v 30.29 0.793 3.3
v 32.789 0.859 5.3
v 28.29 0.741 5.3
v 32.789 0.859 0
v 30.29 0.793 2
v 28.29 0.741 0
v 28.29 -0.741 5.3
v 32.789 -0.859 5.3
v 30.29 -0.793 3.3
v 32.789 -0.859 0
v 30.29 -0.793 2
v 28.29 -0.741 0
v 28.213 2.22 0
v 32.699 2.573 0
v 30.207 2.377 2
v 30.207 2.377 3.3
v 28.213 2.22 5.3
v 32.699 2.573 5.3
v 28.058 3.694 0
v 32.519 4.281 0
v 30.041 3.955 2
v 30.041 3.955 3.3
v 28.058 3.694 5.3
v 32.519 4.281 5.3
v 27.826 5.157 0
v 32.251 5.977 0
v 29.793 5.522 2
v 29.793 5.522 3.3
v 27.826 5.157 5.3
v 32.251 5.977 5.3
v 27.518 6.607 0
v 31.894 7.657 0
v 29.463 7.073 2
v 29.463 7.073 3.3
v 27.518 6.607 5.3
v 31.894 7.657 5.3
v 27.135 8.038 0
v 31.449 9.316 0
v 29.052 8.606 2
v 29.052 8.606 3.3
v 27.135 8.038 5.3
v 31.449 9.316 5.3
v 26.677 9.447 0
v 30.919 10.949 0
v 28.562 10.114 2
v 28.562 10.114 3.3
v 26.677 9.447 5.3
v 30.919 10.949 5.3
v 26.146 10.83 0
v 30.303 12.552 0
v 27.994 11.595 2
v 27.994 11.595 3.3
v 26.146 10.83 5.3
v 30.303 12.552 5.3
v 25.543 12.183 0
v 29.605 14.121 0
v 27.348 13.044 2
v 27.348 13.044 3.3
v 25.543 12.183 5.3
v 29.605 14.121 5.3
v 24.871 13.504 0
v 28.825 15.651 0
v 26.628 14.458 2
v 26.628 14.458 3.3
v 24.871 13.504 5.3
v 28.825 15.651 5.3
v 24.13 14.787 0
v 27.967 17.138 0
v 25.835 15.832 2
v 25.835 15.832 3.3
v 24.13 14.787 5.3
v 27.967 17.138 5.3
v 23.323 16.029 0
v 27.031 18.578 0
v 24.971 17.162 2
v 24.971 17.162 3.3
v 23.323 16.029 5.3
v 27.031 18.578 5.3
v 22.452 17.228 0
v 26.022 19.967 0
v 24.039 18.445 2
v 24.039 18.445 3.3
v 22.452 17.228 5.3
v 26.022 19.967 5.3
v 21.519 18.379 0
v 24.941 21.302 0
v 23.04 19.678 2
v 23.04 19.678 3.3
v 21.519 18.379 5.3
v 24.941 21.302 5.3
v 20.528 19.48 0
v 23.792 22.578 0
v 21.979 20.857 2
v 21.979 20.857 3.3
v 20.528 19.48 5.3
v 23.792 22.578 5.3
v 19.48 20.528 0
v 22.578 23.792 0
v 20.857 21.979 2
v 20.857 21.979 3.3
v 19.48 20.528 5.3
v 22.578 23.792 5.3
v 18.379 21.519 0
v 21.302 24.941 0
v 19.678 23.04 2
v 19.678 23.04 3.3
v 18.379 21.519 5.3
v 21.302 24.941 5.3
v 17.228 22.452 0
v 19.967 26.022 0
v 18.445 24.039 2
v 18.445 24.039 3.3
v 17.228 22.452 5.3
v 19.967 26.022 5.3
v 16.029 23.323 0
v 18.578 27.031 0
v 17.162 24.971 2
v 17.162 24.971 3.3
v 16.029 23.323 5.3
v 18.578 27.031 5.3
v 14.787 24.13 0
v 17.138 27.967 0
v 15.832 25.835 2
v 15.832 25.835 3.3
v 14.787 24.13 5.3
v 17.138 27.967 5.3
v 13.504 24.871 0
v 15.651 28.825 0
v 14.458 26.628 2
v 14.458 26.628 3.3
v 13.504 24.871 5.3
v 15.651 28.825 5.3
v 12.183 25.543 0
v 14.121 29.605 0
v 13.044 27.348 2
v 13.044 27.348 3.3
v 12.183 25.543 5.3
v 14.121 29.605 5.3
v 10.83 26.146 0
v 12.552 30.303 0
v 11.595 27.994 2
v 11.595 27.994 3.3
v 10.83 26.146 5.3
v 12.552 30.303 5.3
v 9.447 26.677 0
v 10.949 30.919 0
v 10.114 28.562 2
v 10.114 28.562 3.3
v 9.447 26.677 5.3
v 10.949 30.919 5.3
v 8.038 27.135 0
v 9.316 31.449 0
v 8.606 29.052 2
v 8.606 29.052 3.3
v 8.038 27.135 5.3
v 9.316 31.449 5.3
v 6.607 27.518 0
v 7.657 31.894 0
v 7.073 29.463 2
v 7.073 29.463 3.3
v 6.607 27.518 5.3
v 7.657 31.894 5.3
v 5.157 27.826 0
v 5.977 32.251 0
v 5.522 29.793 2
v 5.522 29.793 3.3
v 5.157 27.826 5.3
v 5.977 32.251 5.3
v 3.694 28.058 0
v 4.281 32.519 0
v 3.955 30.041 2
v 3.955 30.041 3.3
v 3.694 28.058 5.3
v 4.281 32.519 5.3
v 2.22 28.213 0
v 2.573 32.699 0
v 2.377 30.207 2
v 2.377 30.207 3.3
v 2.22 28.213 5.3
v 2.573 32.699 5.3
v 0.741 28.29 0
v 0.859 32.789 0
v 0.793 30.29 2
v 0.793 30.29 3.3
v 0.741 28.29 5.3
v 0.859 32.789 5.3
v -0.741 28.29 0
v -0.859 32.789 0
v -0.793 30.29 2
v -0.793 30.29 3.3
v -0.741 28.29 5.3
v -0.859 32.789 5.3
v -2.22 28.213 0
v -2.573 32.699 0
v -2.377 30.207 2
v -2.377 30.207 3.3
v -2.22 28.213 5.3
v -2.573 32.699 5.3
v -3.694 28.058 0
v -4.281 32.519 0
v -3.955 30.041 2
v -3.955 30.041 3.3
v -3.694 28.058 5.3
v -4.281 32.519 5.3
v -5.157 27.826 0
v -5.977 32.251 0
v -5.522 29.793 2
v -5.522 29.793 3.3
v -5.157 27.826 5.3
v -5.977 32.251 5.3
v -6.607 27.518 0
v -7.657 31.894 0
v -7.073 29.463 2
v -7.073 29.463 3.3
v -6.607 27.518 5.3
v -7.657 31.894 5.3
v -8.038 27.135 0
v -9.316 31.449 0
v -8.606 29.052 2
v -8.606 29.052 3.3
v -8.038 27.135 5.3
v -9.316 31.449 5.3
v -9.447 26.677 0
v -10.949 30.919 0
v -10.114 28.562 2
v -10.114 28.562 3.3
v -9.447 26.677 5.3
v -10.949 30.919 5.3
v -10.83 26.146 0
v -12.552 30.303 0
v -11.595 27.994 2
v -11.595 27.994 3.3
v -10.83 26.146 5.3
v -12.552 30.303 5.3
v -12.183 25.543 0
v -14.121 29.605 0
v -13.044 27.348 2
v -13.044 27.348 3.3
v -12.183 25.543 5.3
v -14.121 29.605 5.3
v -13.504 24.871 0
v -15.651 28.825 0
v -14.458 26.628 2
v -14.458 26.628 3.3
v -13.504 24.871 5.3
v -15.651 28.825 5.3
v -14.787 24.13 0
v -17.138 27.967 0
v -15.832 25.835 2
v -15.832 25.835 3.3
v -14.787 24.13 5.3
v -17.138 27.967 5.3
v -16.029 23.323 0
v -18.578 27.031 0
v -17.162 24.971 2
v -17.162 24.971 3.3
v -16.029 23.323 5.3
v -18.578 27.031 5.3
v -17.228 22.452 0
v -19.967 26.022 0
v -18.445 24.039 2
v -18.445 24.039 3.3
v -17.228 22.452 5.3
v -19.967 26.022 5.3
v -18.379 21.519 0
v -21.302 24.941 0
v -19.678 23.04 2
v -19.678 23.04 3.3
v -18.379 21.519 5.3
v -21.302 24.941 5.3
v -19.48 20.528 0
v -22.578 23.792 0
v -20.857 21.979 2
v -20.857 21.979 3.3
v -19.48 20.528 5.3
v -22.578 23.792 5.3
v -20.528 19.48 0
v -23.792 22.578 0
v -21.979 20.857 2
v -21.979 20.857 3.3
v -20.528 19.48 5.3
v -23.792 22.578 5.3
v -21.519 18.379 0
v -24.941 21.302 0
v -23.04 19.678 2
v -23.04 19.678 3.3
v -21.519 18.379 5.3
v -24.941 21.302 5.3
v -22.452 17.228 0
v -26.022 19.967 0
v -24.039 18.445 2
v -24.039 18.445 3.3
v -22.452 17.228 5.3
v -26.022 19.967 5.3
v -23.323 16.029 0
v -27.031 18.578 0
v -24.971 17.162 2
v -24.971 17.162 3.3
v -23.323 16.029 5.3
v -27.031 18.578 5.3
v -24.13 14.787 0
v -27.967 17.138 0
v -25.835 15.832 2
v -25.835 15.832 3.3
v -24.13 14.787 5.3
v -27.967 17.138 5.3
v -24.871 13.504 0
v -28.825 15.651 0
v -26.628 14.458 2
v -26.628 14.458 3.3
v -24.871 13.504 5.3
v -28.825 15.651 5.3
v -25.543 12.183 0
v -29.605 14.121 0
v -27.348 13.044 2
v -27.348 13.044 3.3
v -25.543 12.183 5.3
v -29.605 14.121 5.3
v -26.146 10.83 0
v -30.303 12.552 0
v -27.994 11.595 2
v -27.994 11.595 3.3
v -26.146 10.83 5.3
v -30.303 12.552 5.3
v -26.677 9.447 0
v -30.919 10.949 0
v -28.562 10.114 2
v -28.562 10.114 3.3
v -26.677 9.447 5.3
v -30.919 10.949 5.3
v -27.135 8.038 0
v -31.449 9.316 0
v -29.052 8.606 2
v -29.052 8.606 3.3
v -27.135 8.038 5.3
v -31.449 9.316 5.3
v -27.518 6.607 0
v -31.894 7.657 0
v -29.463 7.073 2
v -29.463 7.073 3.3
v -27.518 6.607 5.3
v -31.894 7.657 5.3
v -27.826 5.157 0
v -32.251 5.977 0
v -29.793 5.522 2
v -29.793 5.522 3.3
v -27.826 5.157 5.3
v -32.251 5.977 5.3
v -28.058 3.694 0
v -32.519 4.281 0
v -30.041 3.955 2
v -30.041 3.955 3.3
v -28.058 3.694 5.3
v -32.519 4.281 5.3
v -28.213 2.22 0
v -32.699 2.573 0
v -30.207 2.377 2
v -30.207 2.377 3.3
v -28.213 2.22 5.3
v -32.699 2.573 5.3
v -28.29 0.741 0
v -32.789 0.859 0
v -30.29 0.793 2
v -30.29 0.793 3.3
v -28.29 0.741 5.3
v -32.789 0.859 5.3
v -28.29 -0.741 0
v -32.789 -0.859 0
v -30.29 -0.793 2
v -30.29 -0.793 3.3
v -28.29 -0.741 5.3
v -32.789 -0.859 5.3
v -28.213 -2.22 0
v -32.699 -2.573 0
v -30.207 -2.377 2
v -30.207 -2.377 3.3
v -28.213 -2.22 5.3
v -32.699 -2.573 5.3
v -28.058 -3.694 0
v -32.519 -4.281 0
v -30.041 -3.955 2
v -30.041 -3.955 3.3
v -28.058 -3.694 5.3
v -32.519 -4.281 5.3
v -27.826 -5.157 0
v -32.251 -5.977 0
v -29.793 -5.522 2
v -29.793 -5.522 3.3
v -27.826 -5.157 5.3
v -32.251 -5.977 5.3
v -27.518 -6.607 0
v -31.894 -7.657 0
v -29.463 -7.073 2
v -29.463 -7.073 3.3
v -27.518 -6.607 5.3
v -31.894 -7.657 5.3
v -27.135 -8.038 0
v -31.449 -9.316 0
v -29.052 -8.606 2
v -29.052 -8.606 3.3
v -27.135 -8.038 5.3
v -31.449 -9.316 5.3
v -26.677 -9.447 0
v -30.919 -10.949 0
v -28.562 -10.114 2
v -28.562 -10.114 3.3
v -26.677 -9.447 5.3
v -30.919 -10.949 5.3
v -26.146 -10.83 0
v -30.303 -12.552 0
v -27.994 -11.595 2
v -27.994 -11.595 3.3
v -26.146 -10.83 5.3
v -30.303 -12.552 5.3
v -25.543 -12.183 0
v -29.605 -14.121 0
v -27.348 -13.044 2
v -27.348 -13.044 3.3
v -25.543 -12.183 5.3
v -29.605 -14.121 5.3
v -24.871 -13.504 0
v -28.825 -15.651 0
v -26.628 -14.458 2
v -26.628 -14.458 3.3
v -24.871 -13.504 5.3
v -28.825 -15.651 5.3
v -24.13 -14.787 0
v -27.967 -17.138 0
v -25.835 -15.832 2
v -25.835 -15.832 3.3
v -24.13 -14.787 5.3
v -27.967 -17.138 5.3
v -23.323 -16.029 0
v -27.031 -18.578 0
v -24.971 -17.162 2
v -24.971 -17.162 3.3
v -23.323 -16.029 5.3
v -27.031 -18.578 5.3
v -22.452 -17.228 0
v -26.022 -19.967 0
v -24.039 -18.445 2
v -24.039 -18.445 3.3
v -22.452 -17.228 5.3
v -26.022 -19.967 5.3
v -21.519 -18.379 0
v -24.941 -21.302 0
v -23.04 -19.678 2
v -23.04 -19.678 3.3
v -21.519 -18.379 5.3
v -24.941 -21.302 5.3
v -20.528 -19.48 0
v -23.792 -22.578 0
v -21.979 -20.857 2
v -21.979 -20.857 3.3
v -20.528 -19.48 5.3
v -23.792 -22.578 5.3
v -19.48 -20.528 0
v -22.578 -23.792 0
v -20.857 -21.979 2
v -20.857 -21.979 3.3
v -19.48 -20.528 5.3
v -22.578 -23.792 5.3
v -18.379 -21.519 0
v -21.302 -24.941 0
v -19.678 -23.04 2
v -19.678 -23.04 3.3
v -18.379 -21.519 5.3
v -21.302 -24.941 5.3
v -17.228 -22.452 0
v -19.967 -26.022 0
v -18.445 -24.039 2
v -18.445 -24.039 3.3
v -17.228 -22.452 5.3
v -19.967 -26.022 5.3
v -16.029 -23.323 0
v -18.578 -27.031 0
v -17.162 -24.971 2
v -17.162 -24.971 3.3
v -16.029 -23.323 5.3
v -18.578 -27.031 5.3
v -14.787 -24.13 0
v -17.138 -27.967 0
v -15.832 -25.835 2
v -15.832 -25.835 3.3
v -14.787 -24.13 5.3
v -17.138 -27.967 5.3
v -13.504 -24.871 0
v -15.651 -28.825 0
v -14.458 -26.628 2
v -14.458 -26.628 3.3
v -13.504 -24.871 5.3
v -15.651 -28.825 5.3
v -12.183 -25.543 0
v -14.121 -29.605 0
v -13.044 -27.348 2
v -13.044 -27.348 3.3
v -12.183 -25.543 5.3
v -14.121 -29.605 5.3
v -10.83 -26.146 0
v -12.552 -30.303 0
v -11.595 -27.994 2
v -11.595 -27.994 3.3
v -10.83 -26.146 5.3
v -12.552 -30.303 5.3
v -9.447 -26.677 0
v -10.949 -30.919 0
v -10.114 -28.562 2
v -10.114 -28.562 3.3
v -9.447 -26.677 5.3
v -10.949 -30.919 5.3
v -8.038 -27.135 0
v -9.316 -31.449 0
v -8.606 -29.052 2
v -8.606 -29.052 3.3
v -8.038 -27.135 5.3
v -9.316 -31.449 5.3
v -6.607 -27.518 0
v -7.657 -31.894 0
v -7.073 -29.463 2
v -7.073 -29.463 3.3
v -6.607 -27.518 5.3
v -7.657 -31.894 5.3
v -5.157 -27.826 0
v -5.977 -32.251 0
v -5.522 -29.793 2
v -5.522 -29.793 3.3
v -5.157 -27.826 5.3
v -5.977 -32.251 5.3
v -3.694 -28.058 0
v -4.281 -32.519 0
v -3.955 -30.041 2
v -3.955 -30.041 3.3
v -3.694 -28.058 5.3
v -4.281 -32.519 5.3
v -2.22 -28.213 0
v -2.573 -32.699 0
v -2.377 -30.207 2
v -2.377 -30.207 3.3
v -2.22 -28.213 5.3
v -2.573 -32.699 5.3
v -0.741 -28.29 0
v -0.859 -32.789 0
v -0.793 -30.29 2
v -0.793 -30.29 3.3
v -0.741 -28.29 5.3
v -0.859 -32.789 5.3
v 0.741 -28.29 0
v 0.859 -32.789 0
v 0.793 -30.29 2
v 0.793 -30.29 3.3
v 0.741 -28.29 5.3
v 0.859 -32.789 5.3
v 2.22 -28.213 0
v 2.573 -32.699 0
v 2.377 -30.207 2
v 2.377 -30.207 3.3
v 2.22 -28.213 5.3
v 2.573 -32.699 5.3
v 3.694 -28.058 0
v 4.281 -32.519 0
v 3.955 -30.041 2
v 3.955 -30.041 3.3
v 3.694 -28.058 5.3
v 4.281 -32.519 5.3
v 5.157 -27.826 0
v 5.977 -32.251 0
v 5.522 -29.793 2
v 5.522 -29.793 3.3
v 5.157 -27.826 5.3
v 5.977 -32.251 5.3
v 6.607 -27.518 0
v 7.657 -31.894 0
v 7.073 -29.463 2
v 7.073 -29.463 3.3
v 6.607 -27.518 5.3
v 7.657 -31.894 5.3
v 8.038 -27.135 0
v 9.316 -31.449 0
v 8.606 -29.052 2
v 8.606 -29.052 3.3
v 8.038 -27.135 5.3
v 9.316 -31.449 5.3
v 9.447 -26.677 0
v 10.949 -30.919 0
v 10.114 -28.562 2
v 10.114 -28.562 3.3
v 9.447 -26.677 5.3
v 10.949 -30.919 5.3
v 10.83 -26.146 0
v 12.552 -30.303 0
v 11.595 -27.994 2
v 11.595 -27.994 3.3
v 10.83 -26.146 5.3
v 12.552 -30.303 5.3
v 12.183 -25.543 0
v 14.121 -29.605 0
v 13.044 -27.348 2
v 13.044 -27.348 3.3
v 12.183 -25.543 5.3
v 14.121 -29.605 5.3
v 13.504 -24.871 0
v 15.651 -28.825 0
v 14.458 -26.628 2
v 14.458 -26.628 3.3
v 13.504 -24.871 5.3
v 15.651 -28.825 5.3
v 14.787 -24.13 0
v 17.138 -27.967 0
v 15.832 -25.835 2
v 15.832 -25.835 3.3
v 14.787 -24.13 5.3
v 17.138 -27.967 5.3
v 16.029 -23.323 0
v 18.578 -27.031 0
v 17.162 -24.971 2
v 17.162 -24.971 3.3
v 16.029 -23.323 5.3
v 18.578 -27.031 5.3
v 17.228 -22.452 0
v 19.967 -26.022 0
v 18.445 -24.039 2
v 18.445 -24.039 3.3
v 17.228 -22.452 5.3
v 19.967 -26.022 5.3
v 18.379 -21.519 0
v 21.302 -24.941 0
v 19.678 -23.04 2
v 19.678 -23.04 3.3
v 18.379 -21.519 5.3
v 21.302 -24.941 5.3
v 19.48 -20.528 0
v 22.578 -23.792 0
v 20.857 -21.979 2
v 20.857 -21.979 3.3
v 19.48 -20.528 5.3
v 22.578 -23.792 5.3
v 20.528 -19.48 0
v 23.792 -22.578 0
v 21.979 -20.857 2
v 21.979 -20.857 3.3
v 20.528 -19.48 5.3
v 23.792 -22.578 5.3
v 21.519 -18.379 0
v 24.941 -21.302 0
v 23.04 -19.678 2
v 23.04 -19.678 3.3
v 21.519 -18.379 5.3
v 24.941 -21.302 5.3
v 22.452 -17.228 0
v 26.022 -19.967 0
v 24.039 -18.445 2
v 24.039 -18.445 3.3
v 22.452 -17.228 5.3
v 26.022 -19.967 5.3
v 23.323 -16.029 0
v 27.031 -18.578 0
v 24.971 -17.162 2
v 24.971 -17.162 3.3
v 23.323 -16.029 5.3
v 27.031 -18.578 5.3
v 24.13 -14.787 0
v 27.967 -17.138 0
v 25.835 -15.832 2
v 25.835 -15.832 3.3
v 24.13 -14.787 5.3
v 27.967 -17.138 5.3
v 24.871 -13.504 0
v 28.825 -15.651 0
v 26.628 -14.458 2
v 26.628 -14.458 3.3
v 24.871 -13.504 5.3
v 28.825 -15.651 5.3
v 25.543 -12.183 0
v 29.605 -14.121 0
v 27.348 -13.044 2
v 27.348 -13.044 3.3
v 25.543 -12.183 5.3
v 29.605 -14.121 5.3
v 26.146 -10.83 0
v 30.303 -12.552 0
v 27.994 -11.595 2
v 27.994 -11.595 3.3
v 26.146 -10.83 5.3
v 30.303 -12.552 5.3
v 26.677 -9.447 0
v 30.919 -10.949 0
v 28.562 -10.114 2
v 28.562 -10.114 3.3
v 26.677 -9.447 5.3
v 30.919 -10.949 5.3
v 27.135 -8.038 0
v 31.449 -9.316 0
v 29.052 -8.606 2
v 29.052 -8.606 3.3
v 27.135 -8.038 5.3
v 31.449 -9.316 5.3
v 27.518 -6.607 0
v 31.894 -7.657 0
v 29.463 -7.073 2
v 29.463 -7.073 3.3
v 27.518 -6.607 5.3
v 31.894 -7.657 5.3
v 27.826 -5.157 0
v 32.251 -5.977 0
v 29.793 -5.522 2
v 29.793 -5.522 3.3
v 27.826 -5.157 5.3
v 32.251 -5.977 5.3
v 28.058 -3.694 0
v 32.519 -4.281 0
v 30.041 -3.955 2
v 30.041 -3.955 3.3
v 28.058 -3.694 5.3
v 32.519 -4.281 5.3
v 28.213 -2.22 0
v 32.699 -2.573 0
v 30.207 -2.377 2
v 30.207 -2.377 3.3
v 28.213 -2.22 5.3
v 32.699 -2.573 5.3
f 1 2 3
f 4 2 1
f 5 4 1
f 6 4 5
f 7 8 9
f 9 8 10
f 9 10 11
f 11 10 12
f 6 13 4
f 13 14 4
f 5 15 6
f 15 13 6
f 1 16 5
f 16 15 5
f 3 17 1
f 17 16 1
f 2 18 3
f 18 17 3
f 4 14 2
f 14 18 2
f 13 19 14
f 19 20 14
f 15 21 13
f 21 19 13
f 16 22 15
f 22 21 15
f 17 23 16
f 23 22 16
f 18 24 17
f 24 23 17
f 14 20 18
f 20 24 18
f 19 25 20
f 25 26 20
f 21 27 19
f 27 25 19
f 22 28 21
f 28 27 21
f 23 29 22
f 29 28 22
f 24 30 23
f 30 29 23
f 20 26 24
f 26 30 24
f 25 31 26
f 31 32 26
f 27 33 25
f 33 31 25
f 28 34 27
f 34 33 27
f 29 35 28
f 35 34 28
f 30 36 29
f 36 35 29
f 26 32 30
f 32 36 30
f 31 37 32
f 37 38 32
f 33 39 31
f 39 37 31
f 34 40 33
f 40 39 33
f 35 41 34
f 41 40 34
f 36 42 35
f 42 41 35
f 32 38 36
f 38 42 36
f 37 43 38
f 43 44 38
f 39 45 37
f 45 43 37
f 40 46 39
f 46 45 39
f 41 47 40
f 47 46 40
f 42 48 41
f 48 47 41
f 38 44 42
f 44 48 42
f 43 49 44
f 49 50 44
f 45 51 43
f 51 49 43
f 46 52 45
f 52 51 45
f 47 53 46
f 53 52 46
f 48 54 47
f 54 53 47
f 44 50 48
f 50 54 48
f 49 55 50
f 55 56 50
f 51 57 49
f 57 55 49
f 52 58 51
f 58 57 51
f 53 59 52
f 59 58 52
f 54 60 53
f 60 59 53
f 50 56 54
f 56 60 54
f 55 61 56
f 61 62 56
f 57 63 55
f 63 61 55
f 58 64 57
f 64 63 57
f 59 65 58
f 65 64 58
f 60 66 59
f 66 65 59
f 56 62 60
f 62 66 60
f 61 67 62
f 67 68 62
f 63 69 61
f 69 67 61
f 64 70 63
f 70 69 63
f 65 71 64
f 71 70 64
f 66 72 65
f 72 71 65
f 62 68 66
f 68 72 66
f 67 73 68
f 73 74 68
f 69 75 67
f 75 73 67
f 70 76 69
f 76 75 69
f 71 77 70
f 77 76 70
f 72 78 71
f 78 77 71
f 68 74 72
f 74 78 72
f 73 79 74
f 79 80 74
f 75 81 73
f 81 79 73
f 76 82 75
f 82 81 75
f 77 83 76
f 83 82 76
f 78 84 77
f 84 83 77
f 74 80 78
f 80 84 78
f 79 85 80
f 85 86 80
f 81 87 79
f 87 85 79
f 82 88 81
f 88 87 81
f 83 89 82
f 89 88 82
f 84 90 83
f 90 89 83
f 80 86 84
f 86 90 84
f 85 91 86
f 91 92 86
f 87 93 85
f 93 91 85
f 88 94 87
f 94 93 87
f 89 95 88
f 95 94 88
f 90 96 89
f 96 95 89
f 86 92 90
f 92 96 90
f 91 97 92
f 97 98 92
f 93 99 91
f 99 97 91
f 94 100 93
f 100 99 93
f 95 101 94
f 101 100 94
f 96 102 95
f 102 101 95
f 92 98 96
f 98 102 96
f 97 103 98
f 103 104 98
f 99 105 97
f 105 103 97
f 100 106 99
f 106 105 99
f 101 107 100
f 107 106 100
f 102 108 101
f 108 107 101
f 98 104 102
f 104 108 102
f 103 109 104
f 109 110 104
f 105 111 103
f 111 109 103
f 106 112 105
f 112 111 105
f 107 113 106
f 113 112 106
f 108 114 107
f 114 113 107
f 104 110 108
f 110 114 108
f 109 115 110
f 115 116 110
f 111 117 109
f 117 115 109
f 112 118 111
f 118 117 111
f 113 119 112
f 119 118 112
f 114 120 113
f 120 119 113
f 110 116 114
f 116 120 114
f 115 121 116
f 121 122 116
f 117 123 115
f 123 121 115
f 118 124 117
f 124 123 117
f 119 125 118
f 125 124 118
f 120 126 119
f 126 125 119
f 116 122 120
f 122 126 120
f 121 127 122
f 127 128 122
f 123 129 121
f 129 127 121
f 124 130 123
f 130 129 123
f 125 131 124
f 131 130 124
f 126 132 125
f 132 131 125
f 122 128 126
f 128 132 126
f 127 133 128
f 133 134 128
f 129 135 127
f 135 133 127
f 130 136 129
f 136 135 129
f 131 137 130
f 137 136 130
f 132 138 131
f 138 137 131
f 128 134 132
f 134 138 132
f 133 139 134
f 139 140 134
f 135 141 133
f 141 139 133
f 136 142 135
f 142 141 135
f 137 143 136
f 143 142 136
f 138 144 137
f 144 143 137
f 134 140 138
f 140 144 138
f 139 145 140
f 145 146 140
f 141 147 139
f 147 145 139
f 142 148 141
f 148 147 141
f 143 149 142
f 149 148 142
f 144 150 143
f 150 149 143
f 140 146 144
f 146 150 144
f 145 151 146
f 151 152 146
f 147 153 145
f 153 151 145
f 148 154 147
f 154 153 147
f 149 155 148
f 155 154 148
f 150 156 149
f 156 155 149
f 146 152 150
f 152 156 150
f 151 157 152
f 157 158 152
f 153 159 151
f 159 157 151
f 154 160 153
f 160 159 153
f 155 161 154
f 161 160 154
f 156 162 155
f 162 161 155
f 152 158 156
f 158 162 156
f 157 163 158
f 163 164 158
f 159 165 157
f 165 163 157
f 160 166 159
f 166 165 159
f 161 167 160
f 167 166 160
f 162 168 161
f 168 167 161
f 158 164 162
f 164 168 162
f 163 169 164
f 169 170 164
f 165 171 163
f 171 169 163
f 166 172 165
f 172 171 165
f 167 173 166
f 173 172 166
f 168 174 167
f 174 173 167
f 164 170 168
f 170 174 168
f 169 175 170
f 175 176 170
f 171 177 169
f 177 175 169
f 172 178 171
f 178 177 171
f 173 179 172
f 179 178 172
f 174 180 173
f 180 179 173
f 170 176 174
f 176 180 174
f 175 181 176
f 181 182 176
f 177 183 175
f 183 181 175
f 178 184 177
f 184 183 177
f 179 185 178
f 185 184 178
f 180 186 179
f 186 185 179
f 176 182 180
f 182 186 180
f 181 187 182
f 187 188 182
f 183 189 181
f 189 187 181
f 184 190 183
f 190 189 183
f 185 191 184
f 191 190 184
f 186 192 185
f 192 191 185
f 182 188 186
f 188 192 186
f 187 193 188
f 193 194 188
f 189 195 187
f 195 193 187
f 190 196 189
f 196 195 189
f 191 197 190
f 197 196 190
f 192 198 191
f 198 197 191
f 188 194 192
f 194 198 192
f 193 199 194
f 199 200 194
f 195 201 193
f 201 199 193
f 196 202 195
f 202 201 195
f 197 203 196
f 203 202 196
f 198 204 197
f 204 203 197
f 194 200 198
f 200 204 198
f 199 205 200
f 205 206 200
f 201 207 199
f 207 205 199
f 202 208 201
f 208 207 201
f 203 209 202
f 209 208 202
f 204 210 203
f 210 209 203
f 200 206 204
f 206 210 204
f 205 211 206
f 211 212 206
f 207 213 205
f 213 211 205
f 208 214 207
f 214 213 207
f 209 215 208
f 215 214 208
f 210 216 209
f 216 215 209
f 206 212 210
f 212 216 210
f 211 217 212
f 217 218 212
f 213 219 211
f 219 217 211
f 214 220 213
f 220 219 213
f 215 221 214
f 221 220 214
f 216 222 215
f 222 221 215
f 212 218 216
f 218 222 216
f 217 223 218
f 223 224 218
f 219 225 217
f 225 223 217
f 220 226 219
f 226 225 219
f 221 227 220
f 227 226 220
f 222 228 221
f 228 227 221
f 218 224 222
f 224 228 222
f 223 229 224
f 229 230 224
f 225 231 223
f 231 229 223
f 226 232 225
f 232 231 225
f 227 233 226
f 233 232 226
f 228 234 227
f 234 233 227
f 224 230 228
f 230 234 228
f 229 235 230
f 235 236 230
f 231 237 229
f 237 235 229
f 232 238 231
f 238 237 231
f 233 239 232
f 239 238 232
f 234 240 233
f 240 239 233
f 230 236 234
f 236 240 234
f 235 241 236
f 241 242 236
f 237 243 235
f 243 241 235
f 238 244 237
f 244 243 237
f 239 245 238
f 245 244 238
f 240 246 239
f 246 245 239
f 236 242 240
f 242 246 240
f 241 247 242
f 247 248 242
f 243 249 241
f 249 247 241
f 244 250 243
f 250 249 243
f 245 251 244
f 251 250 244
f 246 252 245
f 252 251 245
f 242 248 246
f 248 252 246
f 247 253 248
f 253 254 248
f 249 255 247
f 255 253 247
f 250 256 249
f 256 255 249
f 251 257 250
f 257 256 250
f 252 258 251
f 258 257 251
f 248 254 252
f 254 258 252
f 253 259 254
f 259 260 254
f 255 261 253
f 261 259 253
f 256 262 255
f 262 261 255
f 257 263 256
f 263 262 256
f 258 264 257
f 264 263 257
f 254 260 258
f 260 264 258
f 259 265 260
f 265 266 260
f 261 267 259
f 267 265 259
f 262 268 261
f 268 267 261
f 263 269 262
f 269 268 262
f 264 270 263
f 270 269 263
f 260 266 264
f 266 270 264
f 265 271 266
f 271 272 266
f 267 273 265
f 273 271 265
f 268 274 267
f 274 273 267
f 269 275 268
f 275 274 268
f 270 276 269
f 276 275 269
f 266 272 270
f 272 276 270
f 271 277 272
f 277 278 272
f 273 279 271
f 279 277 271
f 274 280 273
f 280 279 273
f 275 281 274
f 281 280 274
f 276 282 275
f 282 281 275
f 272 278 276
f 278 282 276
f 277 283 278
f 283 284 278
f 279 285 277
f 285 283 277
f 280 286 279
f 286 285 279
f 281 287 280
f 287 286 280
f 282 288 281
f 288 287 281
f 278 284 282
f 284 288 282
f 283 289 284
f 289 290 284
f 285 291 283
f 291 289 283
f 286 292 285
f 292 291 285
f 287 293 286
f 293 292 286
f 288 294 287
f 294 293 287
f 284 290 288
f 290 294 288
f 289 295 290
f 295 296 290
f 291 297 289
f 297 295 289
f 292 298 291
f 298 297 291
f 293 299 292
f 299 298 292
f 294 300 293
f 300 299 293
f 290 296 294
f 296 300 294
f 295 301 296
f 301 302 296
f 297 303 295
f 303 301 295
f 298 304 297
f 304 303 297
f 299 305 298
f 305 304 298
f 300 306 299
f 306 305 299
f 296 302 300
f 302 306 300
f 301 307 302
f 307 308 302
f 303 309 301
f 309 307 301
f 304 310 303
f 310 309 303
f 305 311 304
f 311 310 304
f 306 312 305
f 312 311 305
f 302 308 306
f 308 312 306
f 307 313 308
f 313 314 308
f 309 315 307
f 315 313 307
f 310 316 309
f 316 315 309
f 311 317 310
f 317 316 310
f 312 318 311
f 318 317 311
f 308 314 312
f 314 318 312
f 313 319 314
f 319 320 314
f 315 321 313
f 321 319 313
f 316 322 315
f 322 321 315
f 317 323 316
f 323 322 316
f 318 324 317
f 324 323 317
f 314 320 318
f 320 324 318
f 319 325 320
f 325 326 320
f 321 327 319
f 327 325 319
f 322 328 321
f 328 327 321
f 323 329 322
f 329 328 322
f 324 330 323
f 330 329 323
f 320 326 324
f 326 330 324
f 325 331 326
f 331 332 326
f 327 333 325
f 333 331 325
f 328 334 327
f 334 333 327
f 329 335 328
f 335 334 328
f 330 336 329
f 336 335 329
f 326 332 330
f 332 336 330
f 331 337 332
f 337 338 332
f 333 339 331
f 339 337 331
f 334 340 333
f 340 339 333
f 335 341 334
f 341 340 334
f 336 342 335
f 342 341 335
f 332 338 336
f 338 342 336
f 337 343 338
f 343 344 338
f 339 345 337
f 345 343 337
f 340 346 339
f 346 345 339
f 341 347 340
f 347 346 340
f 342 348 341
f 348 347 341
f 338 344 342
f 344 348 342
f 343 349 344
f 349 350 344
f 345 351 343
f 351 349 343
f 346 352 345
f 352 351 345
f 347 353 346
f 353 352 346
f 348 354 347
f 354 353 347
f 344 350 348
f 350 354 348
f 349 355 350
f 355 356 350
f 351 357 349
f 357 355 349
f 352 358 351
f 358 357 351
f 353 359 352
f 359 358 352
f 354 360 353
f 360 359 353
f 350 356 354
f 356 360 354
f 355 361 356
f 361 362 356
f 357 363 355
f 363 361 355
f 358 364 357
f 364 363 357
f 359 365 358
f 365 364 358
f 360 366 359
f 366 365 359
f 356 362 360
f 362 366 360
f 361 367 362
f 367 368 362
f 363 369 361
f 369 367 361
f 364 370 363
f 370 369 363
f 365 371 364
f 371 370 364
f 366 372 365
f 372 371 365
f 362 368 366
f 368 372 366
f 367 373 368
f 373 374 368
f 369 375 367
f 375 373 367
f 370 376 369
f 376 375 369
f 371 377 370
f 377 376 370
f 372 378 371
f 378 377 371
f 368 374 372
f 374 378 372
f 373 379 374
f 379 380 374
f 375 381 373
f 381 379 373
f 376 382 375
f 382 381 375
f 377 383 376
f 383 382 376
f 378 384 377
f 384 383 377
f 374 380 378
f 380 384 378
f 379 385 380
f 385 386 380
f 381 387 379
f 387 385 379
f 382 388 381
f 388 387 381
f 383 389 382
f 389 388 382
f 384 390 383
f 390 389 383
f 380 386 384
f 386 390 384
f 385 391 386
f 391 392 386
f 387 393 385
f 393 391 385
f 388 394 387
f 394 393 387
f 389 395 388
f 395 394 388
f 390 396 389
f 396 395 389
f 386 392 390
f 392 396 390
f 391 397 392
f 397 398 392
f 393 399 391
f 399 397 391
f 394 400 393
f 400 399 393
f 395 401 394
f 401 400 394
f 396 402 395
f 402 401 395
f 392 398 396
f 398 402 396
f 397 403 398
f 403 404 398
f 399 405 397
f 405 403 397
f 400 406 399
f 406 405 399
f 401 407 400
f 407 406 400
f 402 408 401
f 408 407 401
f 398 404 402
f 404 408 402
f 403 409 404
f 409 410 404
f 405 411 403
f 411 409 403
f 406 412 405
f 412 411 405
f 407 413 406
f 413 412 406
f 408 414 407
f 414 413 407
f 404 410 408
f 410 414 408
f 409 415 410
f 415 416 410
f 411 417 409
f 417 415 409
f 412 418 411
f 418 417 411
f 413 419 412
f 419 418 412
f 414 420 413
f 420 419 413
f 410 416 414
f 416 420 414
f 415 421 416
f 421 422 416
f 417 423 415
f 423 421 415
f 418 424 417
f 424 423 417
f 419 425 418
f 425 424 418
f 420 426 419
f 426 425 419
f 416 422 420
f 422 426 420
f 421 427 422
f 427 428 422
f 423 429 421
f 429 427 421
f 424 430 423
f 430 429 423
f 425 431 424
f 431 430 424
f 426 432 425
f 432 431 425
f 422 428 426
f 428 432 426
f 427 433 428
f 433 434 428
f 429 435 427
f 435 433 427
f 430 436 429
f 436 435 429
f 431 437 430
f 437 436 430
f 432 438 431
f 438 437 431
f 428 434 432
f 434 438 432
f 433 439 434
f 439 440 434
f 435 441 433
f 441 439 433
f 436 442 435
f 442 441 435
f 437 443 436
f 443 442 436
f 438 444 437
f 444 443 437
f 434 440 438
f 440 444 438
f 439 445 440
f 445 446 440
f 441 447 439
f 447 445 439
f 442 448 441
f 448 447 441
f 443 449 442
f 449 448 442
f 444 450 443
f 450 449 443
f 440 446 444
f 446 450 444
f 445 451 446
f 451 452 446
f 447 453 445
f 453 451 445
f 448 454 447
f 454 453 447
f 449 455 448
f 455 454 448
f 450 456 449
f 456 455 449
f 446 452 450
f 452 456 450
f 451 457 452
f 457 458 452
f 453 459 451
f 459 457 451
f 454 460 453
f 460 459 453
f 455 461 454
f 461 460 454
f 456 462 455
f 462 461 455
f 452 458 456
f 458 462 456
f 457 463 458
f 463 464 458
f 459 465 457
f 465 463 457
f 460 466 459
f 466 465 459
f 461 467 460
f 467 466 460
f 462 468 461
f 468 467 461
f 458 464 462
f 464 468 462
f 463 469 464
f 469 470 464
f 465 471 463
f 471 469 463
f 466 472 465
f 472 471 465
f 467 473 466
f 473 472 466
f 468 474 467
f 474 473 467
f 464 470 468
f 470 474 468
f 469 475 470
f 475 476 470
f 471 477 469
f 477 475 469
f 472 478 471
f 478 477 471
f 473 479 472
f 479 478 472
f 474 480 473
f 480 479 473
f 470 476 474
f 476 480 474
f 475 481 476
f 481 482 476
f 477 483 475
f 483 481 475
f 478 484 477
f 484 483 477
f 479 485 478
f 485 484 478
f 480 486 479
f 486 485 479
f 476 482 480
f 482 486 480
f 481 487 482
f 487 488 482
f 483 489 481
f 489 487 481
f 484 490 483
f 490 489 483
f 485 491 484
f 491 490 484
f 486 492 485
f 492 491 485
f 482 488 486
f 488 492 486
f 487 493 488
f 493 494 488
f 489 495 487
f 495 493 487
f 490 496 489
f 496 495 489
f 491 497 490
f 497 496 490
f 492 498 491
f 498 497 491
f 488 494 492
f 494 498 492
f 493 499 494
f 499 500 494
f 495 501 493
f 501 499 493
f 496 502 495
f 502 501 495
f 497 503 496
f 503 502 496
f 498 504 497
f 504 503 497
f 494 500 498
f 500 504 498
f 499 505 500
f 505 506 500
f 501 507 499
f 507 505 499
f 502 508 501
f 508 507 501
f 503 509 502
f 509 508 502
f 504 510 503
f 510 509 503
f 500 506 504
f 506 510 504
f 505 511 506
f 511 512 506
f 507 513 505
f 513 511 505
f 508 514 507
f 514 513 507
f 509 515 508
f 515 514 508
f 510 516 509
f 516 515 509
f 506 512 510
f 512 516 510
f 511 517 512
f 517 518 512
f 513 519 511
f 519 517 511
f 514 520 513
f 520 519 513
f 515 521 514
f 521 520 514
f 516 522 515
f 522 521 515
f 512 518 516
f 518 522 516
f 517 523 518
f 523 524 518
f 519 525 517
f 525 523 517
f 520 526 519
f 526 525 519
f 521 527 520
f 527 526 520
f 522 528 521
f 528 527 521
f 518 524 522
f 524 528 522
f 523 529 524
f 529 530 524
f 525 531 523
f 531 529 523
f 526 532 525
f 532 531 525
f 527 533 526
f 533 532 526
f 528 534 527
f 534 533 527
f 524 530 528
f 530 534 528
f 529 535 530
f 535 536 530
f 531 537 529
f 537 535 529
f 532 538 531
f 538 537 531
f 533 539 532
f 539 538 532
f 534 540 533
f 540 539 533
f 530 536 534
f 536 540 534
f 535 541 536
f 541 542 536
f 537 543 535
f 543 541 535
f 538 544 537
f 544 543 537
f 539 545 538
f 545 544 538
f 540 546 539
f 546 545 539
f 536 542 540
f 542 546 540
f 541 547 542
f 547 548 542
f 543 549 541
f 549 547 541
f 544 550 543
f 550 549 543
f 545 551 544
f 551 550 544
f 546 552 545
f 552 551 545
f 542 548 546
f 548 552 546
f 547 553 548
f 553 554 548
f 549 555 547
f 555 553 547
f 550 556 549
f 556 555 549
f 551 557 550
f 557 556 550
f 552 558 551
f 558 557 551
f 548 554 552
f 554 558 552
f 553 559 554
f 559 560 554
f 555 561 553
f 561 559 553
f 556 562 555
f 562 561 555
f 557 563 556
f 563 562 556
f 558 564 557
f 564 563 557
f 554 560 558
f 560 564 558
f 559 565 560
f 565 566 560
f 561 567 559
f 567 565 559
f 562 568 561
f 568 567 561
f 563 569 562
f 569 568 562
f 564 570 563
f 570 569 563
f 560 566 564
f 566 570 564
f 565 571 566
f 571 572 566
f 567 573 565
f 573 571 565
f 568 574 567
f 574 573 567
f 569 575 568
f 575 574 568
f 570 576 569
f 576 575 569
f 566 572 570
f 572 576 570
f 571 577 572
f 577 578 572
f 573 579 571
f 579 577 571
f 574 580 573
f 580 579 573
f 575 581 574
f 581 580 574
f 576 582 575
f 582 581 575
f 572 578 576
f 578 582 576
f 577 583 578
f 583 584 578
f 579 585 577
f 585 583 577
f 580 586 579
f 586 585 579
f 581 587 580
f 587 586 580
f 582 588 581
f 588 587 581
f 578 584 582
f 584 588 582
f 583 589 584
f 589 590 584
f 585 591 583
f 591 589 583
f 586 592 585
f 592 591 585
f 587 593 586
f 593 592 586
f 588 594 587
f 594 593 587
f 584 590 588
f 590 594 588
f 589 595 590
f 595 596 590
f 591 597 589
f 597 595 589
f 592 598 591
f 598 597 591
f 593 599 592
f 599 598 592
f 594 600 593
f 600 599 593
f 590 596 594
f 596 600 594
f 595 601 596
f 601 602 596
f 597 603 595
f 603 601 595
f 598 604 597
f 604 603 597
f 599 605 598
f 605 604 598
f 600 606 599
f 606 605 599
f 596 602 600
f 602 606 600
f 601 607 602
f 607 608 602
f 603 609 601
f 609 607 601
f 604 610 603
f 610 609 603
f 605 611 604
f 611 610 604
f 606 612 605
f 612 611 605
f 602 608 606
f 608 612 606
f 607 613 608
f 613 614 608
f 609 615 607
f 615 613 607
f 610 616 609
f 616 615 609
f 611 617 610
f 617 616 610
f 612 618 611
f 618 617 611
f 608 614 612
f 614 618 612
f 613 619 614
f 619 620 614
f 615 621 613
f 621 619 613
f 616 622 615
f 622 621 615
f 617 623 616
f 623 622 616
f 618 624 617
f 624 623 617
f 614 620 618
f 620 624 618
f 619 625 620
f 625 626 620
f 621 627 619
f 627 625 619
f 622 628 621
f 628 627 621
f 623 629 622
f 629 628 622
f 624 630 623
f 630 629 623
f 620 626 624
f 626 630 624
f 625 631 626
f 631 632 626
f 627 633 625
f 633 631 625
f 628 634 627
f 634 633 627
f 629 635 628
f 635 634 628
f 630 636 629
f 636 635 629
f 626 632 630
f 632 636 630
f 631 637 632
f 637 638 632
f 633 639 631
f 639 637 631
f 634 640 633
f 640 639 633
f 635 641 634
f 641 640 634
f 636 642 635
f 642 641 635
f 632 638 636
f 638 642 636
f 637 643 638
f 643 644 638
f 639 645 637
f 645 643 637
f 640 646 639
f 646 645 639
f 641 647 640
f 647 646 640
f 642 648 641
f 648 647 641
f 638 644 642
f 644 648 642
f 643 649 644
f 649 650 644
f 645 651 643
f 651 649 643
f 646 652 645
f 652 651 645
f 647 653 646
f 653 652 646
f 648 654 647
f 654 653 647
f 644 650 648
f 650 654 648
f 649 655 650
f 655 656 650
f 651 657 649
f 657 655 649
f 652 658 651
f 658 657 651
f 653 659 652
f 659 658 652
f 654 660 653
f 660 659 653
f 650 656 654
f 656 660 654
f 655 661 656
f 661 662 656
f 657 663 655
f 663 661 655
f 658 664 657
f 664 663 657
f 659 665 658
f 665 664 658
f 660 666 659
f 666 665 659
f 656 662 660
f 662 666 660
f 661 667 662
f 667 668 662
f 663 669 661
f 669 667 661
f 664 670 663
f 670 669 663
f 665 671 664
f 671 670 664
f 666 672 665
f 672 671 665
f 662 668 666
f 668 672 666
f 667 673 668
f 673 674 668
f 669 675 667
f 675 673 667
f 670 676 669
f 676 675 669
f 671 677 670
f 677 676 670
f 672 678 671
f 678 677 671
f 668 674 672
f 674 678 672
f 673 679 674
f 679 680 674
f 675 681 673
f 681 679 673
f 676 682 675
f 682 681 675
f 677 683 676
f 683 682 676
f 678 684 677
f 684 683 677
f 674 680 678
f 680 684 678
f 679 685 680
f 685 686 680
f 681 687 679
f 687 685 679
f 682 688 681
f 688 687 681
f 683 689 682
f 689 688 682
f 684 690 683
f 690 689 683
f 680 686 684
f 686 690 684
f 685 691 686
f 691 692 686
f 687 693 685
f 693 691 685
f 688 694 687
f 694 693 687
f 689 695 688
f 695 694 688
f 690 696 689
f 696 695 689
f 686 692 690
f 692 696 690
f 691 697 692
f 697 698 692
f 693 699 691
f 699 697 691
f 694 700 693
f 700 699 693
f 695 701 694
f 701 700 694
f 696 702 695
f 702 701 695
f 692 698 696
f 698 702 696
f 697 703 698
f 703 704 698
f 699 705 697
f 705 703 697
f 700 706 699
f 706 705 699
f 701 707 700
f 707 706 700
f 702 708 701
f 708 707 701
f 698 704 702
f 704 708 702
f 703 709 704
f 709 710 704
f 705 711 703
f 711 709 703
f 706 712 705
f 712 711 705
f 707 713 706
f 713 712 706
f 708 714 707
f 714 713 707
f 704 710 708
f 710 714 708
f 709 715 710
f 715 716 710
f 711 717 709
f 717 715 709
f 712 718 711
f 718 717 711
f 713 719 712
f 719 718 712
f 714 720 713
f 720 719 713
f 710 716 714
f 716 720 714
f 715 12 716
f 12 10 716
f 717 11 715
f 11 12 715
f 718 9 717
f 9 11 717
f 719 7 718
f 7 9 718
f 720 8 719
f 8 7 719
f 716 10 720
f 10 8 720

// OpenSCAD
$fn = 120; // High resolution for smooth circular curves

// --- Lens Parameters ---
lens_diameter = 60.0;
lens_thickness = 1.0;

// --- Frame Parameters ---
tolerance = 0.3;       // Extra clearance in the groove to ensure the lens fits
lip_width = 2.0;       // How much the plastic lip overlaps the lens (retention)
wall_thickness = 2.5;  // Thickness of the outer solid wall
gap_angle = 3;        // Opening angle (slit) allowing the frame to flex

// --- Derived Dimensions ---
groove_radius = (lens_diameter / 2) + tolerance;
inner_radius  = groove_radius - lip_width;
outer_radius  = groove_radius + wall_thickness;

// Heights are calculated to create exactly 45-degree overhangs
// (In a 45-deg triangle, the height equals the width)
bottom_chamfer_h = lip_width;
slot_h           = lens_thickness + 0.3; // Slot height with slight vertical clearance
top_chamfer_h    = lip_width;
total_h          = bottom_chamfer_h + slot_h + top_chamfer_h;

// --- 2D Profile of the Ring ---
// Coordinates [X, Y] defined counter-clockwise starting from bottom-inner edge
frame_profile = [
    [inner_radius, 0],                                // Bottom inner edge
    [outer_radius, 0],                                // Bottom outer edge
    [outer_radius, total_h],                          // Top outer edge
    [inner_radius, total_h],                          // Top inner edge
    [groove_radius, bottom_chamfer_h + slot_h],       // Upper inner corner of groove
    [groove_radius, bottom_chamfer_h]                 // Lower inner corner of groove
];

    // 1. Main C-Ring Frame
    // Rotated so the gap is evenly centered on the X-axis
    rotate([0, 0, gap_angle / 2])
        rotate_extrude(angle = 360 - gap_angle, convexity = 10)
            polygon(frame_profile);
